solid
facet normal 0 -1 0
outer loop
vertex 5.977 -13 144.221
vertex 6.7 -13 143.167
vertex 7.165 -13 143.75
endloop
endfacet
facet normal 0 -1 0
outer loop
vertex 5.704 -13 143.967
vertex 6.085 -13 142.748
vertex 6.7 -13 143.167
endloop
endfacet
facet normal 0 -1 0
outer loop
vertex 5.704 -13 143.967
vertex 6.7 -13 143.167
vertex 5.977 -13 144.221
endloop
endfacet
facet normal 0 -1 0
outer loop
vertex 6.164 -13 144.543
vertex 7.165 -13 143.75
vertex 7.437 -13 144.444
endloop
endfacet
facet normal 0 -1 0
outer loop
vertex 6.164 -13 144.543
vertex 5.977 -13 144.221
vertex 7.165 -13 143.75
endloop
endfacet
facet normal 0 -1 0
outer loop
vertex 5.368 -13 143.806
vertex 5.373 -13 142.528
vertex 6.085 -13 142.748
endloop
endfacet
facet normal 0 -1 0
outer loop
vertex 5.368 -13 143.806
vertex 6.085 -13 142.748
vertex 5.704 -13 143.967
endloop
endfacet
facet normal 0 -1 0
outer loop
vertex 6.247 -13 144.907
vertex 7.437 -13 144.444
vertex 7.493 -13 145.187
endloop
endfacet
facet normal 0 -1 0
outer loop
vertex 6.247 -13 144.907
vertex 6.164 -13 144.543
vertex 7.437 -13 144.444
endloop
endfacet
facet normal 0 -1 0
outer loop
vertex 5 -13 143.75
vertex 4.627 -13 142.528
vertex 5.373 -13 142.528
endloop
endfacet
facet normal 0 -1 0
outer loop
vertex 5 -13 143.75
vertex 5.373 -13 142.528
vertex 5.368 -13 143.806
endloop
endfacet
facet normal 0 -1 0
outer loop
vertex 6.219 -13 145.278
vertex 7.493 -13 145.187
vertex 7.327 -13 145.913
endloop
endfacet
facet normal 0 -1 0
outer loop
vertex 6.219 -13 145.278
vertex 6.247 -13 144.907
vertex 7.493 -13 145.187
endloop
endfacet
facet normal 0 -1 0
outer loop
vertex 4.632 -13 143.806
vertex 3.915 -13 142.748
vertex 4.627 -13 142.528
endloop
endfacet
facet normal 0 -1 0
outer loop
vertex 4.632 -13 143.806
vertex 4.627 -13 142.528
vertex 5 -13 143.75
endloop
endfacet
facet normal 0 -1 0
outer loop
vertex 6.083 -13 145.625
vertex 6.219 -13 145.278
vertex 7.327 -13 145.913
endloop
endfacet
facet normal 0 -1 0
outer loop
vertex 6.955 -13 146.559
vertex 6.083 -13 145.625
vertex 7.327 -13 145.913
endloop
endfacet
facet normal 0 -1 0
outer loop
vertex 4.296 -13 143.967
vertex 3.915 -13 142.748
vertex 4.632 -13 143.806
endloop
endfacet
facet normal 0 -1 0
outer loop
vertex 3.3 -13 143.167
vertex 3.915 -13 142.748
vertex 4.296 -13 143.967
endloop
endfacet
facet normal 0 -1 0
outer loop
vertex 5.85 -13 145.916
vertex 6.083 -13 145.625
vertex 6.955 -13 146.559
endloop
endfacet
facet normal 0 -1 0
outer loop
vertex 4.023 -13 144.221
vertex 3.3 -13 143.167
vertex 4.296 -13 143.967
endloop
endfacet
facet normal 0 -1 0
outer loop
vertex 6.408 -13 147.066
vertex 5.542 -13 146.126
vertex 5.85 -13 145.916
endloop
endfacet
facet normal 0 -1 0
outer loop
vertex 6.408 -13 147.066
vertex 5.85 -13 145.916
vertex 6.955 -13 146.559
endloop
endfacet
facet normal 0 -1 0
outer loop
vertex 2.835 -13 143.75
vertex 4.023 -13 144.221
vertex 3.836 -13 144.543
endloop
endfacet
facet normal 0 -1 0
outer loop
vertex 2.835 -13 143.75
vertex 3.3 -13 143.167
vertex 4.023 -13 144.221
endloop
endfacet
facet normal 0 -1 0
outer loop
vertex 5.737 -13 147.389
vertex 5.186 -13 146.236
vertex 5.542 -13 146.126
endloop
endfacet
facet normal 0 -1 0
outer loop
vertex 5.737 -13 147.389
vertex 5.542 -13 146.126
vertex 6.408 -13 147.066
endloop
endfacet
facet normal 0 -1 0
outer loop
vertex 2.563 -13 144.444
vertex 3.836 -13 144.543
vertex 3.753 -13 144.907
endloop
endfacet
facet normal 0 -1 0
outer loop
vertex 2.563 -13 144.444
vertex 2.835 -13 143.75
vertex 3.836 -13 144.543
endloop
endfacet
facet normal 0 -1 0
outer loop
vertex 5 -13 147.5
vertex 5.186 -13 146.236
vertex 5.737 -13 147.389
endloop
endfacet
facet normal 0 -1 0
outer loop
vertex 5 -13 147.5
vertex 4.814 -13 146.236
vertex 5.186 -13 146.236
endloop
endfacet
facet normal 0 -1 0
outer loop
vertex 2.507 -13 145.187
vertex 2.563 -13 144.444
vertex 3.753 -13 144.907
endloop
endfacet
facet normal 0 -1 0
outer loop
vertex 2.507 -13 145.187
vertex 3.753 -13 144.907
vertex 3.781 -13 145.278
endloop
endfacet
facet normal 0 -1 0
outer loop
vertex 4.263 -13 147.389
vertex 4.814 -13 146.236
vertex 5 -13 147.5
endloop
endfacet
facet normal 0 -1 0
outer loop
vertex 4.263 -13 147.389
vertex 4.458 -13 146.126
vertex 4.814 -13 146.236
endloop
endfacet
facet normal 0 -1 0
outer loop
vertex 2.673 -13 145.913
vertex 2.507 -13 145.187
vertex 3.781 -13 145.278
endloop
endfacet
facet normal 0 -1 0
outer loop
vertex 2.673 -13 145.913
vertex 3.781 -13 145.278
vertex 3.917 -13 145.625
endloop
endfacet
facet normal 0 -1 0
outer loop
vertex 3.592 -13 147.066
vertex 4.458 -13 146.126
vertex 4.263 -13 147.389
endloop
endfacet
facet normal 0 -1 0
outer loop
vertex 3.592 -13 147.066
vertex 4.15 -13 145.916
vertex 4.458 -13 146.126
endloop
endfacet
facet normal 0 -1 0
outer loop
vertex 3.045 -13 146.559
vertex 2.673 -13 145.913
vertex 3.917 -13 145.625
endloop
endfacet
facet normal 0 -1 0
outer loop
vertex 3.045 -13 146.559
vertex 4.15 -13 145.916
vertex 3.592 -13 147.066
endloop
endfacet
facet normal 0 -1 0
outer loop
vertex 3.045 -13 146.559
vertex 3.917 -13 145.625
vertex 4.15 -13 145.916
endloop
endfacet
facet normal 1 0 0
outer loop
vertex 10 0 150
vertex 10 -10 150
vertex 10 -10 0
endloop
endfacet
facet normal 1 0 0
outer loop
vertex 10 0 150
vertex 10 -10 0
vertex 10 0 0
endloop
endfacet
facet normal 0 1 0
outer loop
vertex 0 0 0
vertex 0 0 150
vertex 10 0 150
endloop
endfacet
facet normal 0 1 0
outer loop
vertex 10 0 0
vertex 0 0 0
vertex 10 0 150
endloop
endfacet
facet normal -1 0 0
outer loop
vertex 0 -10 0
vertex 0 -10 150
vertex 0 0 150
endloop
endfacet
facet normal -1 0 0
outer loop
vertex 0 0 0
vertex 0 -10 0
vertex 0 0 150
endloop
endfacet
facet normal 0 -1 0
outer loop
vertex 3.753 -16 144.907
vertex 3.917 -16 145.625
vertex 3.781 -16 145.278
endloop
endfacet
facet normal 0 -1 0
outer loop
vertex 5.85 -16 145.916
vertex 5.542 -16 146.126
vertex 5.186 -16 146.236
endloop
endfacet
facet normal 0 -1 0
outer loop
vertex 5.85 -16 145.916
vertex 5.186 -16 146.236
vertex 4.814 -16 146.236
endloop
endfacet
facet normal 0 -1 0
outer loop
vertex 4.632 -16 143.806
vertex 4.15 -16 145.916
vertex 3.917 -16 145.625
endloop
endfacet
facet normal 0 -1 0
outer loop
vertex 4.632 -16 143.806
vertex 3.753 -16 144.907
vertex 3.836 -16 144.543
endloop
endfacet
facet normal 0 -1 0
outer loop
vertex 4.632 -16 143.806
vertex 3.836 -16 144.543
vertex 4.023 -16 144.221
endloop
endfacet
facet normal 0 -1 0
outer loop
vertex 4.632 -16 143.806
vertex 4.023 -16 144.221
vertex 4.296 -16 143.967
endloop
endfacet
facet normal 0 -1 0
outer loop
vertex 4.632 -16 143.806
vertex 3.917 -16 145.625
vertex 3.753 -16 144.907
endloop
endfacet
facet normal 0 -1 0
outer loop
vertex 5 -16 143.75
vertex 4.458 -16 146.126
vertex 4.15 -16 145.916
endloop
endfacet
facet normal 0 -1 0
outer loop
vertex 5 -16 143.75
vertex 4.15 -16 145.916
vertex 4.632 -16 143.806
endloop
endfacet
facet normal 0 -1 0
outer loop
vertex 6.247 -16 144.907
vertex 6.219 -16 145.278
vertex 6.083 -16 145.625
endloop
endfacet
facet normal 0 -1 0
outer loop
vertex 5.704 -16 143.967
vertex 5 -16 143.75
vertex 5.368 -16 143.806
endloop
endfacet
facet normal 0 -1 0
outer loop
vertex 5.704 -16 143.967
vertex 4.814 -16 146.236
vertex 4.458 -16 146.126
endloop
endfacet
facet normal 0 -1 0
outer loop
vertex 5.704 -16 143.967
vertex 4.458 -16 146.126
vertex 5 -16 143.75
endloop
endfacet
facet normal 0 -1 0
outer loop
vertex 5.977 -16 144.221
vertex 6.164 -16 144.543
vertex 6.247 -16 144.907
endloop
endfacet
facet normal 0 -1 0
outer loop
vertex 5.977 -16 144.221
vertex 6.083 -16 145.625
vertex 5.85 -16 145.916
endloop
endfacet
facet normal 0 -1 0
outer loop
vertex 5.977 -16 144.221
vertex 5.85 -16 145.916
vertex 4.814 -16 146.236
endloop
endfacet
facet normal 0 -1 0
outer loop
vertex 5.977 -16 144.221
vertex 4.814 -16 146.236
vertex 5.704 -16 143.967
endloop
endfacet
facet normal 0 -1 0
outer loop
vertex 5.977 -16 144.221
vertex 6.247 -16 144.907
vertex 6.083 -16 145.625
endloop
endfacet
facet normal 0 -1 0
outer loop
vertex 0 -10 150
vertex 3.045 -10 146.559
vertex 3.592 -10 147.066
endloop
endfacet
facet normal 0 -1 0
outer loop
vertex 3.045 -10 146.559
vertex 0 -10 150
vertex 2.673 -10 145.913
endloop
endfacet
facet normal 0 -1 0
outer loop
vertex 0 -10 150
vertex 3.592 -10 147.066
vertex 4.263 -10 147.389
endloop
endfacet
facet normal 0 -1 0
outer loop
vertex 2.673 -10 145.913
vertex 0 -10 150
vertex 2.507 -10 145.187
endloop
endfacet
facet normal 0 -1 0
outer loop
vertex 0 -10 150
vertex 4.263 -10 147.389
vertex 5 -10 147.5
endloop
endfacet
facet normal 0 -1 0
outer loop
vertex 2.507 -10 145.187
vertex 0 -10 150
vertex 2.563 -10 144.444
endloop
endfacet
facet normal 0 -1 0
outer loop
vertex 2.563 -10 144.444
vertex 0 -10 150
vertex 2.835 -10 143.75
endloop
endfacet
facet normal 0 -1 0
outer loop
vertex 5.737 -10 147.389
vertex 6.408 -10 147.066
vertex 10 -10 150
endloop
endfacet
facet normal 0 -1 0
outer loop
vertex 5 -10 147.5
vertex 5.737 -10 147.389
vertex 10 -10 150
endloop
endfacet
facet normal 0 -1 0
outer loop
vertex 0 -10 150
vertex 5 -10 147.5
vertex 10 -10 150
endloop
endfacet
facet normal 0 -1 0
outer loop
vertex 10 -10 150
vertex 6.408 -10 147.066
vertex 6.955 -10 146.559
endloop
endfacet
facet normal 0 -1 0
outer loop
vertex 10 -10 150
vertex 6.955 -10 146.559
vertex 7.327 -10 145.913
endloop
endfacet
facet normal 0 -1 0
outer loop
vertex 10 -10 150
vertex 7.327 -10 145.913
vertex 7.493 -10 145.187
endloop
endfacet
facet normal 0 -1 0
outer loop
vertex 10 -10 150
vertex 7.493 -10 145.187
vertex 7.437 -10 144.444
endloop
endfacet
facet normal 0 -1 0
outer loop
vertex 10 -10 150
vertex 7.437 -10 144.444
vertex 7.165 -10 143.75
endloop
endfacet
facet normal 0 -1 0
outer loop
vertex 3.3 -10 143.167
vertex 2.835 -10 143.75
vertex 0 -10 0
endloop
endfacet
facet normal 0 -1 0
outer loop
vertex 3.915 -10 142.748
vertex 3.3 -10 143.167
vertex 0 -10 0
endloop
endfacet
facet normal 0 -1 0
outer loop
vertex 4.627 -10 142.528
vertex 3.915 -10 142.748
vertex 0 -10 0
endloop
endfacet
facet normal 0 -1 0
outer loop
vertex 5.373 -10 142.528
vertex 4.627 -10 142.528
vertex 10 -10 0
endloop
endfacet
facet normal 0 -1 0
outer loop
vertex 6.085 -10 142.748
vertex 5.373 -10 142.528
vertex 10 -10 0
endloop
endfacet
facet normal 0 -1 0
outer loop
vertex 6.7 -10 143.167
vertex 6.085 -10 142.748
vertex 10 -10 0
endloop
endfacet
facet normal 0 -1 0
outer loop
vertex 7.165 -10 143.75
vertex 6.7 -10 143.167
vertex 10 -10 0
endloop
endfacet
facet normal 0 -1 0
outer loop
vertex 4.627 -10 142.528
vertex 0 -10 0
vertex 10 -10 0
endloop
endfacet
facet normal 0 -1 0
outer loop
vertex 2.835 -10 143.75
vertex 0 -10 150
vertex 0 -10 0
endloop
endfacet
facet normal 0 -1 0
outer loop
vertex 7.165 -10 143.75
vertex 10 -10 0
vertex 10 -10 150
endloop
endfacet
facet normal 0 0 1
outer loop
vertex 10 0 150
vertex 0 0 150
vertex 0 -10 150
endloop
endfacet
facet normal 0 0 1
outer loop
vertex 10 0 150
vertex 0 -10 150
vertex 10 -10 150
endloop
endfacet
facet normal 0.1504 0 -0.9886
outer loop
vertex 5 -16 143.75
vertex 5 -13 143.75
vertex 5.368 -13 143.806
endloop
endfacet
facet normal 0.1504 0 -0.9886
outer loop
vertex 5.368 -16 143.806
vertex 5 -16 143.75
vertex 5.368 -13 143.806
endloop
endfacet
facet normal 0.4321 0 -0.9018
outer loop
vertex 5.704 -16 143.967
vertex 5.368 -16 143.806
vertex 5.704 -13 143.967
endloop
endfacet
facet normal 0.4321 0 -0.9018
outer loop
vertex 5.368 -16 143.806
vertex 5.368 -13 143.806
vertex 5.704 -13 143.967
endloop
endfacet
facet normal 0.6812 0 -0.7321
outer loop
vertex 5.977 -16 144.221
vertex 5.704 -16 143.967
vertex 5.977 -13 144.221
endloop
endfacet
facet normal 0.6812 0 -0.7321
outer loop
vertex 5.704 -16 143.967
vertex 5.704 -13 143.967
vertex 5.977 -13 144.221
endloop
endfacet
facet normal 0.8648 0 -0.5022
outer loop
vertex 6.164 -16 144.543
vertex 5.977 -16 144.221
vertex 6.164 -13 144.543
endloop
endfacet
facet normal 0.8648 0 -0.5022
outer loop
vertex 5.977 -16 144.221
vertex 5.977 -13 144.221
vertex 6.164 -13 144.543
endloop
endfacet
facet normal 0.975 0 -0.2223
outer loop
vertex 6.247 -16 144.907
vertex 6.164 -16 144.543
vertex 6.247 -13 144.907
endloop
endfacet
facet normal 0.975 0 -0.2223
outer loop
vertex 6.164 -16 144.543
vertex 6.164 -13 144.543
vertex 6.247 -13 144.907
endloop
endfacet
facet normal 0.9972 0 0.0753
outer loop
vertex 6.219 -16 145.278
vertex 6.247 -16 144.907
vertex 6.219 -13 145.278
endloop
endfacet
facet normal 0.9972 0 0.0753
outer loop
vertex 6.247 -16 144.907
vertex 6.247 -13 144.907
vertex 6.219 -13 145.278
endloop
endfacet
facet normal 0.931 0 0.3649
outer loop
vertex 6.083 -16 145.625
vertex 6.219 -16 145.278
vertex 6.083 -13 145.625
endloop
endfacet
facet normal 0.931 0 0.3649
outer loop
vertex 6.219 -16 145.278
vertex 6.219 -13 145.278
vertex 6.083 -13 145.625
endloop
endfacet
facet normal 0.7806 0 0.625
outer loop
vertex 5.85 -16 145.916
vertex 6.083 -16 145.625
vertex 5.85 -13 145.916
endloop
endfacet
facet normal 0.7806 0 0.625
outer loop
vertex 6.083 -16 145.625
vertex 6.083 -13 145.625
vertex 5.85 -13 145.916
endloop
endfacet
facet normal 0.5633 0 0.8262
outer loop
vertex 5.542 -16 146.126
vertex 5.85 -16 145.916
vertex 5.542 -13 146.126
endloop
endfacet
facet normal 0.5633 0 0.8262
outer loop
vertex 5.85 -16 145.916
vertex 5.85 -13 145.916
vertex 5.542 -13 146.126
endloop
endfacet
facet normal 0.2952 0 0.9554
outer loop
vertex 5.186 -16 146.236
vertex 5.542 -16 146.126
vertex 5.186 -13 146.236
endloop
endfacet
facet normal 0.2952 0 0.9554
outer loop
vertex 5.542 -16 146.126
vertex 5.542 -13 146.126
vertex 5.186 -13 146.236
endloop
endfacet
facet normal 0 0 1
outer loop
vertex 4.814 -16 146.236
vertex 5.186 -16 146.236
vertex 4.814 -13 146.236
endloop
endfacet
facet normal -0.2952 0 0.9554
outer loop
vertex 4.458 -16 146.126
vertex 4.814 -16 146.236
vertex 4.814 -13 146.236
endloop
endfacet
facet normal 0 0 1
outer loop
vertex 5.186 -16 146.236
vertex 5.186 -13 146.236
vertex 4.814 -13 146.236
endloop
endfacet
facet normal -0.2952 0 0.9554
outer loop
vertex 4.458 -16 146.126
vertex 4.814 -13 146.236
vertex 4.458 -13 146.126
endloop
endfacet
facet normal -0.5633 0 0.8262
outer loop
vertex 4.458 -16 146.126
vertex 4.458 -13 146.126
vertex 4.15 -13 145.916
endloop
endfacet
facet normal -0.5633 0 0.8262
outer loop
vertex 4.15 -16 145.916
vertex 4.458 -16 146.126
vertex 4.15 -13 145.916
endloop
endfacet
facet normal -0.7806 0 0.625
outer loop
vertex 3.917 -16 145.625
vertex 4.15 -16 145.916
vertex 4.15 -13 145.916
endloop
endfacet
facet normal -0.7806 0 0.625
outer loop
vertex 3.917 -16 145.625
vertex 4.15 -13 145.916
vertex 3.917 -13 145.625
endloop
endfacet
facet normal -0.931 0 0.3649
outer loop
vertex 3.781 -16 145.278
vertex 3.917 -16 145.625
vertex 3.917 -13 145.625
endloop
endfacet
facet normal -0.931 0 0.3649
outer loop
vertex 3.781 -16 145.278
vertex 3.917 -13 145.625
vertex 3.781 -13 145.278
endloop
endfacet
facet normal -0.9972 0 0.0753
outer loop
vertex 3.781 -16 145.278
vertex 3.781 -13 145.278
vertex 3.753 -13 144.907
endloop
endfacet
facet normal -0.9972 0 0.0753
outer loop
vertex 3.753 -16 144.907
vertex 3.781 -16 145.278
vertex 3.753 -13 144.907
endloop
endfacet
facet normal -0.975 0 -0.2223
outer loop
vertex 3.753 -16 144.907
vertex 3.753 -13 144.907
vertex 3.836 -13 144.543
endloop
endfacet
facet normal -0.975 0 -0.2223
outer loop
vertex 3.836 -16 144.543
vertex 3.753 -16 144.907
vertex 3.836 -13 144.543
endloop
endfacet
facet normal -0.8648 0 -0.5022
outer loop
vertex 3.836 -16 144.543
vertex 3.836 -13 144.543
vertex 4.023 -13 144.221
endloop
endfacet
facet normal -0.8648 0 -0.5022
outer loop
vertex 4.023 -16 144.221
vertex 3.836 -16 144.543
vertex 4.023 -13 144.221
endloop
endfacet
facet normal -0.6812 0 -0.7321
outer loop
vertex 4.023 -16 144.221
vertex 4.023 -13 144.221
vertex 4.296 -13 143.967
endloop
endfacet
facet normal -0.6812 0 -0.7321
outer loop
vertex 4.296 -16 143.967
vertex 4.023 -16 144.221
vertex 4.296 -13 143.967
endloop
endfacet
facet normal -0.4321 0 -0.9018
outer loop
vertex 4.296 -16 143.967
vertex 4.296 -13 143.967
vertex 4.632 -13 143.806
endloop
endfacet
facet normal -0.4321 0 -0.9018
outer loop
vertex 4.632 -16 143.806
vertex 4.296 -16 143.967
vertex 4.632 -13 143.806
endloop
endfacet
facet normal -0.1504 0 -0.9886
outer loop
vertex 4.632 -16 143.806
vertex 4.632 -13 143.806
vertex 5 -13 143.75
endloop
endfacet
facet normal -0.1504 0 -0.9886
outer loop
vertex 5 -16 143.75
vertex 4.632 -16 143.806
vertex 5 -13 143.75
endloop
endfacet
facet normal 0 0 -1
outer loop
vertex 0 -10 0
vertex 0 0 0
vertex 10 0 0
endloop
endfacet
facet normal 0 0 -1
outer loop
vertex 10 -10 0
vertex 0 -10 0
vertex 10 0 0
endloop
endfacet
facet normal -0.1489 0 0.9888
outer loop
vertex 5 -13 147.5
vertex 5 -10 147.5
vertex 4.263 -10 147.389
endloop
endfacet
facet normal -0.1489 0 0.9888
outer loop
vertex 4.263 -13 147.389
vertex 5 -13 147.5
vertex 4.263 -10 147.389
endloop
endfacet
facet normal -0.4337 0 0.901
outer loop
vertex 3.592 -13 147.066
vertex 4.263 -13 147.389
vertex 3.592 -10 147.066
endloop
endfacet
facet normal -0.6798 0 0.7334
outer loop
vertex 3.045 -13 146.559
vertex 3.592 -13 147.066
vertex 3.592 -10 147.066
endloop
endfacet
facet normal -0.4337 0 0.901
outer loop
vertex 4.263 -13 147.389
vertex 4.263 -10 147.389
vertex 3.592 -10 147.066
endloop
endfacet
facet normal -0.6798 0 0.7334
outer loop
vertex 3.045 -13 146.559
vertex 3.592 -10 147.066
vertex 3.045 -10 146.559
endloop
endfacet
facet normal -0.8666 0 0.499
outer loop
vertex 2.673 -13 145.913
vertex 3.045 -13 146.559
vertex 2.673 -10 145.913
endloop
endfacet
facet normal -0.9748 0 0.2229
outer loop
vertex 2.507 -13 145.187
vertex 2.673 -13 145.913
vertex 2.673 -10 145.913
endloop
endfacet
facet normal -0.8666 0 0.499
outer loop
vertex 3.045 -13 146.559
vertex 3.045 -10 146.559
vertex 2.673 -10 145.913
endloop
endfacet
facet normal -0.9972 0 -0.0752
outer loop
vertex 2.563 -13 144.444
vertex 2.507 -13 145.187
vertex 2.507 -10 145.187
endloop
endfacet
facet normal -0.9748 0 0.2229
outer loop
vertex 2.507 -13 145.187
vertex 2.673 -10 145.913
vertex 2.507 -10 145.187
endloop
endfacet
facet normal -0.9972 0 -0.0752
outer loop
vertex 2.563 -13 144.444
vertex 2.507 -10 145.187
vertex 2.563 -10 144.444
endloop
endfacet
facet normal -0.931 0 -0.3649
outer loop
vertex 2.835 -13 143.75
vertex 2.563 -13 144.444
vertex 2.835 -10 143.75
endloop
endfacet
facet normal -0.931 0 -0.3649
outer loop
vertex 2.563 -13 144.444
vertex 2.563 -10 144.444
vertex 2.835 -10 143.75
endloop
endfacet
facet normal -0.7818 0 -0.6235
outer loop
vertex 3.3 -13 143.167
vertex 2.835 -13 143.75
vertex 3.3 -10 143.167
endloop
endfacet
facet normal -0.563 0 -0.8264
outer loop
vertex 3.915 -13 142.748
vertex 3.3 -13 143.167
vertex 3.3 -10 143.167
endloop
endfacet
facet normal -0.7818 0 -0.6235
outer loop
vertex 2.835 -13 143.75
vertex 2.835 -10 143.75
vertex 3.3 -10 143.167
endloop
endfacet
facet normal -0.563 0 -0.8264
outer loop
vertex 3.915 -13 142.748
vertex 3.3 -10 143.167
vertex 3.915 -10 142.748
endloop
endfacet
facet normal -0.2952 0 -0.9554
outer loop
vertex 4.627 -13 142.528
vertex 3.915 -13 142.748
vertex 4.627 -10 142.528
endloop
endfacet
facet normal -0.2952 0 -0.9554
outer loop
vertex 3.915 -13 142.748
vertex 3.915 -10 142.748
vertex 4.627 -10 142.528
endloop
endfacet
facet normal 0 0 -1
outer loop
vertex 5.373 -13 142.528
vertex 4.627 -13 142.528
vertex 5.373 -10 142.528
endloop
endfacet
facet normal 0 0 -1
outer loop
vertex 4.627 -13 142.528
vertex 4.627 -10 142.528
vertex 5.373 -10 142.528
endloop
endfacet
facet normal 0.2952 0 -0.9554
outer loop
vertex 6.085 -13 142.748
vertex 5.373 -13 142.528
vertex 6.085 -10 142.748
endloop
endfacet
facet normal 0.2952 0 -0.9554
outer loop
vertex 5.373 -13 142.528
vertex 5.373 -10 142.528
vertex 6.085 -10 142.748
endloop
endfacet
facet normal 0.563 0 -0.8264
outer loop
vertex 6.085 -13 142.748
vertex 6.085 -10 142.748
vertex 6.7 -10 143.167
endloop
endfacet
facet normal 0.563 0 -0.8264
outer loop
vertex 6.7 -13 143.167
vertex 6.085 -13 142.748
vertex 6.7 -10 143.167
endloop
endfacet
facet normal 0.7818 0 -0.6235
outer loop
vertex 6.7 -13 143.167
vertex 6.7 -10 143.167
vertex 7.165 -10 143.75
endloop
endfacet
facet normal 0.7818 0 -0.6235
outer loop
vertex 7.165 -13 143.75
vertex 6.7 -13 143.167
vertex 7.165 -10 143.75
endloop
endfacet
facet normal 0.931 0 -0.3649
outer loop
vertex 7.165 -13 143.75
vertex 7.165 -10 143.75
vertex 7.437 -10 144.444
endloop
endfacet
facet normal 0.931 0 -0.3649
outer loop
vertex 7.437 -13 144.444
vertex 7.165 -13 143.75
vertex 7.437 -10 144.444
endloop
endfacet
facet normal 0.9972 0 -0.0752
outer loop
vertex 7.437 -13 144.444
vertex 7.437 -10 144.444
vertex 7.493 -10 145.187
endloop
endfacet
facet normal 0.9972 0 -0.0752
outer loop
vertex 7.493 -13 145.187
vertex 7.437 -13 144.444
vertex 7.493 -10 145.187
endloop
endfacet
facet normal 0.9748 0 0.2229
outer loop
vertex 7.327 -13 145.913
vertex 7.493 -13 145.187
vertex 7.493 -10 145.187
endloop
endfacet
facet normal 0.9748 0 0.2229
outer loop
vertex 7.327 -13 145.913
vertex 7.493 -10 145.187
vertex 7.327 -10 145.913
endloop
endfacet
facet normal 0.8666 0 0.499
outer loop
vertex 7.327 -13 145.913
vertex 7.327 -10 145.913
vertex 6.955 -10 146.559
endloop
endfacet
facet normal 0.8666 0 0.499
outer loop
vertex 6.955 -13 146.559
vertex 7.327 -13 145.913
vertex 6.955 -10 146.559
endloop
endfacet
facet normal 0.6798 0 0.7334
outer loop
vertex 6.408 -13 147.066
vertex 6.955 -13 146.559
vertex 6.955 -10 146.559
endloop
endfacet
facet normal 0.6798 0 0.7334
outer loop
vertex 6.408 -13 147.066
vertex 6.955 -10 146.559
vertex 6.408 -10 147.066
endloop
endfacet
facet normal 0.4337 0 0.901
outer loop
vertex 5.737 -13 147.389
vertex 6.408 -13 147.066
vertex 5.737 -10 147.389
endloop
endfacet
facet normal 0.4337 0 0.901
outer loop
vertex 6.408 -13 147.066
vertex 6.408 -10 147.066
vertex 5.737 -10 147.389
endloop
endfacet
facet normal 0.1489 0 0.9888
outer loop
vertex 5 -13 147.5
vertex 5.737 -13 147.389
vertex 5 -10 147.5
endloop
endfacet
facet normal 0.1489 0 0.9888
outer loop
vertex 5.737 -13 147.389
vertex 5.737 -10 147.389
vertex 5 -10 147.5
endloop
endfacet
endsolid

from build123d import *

# Parameters (mm, degrees)
SKETCH1_W           = 10
SKETCH1_H           = 10
BOSS_EXTRUDE1_DEPTH = 150
SKETCH2_R           = 2.5
BOSS_EXTRUDE2_DEPTH = 3
SKETCH3_R           = 1.25
BOSS_EXTRUDE3_DEPTH = 6


with BuildPart() as part:
    # Sketch1 → Boss-Extrude1 (new body)
    with BuildSketch(Plane.XY):
        with Locations((5, -5)):
            Rectangle(SKETCH1_W, SKETCH1_H)
    extrude(amount=BOSS_EXTRUDE1_DEPTH)

    # Sketch2 → Boss-Extrude2 (add)
    with BuildSketch(Plane.XZ.offset(10)):
        with Locations(Location((5, 145, 0), (0, 0, 90))):
            Circle(SKETCH2_R)
    extrude(amount=BOSS_EXTRUDE2_DEPTH)

    # Sketch3 → Boss-Extrude3 (add)
    with BuildSketch(Plane.XZ.offset(10)):
        with Locations(Location((5, 145, 0), (0, 0, 270))):
            Circle(SKETCH3_R)
    extrude(amount=BOSS_EXTRUDE3_DEPTH)


solid = part.part
